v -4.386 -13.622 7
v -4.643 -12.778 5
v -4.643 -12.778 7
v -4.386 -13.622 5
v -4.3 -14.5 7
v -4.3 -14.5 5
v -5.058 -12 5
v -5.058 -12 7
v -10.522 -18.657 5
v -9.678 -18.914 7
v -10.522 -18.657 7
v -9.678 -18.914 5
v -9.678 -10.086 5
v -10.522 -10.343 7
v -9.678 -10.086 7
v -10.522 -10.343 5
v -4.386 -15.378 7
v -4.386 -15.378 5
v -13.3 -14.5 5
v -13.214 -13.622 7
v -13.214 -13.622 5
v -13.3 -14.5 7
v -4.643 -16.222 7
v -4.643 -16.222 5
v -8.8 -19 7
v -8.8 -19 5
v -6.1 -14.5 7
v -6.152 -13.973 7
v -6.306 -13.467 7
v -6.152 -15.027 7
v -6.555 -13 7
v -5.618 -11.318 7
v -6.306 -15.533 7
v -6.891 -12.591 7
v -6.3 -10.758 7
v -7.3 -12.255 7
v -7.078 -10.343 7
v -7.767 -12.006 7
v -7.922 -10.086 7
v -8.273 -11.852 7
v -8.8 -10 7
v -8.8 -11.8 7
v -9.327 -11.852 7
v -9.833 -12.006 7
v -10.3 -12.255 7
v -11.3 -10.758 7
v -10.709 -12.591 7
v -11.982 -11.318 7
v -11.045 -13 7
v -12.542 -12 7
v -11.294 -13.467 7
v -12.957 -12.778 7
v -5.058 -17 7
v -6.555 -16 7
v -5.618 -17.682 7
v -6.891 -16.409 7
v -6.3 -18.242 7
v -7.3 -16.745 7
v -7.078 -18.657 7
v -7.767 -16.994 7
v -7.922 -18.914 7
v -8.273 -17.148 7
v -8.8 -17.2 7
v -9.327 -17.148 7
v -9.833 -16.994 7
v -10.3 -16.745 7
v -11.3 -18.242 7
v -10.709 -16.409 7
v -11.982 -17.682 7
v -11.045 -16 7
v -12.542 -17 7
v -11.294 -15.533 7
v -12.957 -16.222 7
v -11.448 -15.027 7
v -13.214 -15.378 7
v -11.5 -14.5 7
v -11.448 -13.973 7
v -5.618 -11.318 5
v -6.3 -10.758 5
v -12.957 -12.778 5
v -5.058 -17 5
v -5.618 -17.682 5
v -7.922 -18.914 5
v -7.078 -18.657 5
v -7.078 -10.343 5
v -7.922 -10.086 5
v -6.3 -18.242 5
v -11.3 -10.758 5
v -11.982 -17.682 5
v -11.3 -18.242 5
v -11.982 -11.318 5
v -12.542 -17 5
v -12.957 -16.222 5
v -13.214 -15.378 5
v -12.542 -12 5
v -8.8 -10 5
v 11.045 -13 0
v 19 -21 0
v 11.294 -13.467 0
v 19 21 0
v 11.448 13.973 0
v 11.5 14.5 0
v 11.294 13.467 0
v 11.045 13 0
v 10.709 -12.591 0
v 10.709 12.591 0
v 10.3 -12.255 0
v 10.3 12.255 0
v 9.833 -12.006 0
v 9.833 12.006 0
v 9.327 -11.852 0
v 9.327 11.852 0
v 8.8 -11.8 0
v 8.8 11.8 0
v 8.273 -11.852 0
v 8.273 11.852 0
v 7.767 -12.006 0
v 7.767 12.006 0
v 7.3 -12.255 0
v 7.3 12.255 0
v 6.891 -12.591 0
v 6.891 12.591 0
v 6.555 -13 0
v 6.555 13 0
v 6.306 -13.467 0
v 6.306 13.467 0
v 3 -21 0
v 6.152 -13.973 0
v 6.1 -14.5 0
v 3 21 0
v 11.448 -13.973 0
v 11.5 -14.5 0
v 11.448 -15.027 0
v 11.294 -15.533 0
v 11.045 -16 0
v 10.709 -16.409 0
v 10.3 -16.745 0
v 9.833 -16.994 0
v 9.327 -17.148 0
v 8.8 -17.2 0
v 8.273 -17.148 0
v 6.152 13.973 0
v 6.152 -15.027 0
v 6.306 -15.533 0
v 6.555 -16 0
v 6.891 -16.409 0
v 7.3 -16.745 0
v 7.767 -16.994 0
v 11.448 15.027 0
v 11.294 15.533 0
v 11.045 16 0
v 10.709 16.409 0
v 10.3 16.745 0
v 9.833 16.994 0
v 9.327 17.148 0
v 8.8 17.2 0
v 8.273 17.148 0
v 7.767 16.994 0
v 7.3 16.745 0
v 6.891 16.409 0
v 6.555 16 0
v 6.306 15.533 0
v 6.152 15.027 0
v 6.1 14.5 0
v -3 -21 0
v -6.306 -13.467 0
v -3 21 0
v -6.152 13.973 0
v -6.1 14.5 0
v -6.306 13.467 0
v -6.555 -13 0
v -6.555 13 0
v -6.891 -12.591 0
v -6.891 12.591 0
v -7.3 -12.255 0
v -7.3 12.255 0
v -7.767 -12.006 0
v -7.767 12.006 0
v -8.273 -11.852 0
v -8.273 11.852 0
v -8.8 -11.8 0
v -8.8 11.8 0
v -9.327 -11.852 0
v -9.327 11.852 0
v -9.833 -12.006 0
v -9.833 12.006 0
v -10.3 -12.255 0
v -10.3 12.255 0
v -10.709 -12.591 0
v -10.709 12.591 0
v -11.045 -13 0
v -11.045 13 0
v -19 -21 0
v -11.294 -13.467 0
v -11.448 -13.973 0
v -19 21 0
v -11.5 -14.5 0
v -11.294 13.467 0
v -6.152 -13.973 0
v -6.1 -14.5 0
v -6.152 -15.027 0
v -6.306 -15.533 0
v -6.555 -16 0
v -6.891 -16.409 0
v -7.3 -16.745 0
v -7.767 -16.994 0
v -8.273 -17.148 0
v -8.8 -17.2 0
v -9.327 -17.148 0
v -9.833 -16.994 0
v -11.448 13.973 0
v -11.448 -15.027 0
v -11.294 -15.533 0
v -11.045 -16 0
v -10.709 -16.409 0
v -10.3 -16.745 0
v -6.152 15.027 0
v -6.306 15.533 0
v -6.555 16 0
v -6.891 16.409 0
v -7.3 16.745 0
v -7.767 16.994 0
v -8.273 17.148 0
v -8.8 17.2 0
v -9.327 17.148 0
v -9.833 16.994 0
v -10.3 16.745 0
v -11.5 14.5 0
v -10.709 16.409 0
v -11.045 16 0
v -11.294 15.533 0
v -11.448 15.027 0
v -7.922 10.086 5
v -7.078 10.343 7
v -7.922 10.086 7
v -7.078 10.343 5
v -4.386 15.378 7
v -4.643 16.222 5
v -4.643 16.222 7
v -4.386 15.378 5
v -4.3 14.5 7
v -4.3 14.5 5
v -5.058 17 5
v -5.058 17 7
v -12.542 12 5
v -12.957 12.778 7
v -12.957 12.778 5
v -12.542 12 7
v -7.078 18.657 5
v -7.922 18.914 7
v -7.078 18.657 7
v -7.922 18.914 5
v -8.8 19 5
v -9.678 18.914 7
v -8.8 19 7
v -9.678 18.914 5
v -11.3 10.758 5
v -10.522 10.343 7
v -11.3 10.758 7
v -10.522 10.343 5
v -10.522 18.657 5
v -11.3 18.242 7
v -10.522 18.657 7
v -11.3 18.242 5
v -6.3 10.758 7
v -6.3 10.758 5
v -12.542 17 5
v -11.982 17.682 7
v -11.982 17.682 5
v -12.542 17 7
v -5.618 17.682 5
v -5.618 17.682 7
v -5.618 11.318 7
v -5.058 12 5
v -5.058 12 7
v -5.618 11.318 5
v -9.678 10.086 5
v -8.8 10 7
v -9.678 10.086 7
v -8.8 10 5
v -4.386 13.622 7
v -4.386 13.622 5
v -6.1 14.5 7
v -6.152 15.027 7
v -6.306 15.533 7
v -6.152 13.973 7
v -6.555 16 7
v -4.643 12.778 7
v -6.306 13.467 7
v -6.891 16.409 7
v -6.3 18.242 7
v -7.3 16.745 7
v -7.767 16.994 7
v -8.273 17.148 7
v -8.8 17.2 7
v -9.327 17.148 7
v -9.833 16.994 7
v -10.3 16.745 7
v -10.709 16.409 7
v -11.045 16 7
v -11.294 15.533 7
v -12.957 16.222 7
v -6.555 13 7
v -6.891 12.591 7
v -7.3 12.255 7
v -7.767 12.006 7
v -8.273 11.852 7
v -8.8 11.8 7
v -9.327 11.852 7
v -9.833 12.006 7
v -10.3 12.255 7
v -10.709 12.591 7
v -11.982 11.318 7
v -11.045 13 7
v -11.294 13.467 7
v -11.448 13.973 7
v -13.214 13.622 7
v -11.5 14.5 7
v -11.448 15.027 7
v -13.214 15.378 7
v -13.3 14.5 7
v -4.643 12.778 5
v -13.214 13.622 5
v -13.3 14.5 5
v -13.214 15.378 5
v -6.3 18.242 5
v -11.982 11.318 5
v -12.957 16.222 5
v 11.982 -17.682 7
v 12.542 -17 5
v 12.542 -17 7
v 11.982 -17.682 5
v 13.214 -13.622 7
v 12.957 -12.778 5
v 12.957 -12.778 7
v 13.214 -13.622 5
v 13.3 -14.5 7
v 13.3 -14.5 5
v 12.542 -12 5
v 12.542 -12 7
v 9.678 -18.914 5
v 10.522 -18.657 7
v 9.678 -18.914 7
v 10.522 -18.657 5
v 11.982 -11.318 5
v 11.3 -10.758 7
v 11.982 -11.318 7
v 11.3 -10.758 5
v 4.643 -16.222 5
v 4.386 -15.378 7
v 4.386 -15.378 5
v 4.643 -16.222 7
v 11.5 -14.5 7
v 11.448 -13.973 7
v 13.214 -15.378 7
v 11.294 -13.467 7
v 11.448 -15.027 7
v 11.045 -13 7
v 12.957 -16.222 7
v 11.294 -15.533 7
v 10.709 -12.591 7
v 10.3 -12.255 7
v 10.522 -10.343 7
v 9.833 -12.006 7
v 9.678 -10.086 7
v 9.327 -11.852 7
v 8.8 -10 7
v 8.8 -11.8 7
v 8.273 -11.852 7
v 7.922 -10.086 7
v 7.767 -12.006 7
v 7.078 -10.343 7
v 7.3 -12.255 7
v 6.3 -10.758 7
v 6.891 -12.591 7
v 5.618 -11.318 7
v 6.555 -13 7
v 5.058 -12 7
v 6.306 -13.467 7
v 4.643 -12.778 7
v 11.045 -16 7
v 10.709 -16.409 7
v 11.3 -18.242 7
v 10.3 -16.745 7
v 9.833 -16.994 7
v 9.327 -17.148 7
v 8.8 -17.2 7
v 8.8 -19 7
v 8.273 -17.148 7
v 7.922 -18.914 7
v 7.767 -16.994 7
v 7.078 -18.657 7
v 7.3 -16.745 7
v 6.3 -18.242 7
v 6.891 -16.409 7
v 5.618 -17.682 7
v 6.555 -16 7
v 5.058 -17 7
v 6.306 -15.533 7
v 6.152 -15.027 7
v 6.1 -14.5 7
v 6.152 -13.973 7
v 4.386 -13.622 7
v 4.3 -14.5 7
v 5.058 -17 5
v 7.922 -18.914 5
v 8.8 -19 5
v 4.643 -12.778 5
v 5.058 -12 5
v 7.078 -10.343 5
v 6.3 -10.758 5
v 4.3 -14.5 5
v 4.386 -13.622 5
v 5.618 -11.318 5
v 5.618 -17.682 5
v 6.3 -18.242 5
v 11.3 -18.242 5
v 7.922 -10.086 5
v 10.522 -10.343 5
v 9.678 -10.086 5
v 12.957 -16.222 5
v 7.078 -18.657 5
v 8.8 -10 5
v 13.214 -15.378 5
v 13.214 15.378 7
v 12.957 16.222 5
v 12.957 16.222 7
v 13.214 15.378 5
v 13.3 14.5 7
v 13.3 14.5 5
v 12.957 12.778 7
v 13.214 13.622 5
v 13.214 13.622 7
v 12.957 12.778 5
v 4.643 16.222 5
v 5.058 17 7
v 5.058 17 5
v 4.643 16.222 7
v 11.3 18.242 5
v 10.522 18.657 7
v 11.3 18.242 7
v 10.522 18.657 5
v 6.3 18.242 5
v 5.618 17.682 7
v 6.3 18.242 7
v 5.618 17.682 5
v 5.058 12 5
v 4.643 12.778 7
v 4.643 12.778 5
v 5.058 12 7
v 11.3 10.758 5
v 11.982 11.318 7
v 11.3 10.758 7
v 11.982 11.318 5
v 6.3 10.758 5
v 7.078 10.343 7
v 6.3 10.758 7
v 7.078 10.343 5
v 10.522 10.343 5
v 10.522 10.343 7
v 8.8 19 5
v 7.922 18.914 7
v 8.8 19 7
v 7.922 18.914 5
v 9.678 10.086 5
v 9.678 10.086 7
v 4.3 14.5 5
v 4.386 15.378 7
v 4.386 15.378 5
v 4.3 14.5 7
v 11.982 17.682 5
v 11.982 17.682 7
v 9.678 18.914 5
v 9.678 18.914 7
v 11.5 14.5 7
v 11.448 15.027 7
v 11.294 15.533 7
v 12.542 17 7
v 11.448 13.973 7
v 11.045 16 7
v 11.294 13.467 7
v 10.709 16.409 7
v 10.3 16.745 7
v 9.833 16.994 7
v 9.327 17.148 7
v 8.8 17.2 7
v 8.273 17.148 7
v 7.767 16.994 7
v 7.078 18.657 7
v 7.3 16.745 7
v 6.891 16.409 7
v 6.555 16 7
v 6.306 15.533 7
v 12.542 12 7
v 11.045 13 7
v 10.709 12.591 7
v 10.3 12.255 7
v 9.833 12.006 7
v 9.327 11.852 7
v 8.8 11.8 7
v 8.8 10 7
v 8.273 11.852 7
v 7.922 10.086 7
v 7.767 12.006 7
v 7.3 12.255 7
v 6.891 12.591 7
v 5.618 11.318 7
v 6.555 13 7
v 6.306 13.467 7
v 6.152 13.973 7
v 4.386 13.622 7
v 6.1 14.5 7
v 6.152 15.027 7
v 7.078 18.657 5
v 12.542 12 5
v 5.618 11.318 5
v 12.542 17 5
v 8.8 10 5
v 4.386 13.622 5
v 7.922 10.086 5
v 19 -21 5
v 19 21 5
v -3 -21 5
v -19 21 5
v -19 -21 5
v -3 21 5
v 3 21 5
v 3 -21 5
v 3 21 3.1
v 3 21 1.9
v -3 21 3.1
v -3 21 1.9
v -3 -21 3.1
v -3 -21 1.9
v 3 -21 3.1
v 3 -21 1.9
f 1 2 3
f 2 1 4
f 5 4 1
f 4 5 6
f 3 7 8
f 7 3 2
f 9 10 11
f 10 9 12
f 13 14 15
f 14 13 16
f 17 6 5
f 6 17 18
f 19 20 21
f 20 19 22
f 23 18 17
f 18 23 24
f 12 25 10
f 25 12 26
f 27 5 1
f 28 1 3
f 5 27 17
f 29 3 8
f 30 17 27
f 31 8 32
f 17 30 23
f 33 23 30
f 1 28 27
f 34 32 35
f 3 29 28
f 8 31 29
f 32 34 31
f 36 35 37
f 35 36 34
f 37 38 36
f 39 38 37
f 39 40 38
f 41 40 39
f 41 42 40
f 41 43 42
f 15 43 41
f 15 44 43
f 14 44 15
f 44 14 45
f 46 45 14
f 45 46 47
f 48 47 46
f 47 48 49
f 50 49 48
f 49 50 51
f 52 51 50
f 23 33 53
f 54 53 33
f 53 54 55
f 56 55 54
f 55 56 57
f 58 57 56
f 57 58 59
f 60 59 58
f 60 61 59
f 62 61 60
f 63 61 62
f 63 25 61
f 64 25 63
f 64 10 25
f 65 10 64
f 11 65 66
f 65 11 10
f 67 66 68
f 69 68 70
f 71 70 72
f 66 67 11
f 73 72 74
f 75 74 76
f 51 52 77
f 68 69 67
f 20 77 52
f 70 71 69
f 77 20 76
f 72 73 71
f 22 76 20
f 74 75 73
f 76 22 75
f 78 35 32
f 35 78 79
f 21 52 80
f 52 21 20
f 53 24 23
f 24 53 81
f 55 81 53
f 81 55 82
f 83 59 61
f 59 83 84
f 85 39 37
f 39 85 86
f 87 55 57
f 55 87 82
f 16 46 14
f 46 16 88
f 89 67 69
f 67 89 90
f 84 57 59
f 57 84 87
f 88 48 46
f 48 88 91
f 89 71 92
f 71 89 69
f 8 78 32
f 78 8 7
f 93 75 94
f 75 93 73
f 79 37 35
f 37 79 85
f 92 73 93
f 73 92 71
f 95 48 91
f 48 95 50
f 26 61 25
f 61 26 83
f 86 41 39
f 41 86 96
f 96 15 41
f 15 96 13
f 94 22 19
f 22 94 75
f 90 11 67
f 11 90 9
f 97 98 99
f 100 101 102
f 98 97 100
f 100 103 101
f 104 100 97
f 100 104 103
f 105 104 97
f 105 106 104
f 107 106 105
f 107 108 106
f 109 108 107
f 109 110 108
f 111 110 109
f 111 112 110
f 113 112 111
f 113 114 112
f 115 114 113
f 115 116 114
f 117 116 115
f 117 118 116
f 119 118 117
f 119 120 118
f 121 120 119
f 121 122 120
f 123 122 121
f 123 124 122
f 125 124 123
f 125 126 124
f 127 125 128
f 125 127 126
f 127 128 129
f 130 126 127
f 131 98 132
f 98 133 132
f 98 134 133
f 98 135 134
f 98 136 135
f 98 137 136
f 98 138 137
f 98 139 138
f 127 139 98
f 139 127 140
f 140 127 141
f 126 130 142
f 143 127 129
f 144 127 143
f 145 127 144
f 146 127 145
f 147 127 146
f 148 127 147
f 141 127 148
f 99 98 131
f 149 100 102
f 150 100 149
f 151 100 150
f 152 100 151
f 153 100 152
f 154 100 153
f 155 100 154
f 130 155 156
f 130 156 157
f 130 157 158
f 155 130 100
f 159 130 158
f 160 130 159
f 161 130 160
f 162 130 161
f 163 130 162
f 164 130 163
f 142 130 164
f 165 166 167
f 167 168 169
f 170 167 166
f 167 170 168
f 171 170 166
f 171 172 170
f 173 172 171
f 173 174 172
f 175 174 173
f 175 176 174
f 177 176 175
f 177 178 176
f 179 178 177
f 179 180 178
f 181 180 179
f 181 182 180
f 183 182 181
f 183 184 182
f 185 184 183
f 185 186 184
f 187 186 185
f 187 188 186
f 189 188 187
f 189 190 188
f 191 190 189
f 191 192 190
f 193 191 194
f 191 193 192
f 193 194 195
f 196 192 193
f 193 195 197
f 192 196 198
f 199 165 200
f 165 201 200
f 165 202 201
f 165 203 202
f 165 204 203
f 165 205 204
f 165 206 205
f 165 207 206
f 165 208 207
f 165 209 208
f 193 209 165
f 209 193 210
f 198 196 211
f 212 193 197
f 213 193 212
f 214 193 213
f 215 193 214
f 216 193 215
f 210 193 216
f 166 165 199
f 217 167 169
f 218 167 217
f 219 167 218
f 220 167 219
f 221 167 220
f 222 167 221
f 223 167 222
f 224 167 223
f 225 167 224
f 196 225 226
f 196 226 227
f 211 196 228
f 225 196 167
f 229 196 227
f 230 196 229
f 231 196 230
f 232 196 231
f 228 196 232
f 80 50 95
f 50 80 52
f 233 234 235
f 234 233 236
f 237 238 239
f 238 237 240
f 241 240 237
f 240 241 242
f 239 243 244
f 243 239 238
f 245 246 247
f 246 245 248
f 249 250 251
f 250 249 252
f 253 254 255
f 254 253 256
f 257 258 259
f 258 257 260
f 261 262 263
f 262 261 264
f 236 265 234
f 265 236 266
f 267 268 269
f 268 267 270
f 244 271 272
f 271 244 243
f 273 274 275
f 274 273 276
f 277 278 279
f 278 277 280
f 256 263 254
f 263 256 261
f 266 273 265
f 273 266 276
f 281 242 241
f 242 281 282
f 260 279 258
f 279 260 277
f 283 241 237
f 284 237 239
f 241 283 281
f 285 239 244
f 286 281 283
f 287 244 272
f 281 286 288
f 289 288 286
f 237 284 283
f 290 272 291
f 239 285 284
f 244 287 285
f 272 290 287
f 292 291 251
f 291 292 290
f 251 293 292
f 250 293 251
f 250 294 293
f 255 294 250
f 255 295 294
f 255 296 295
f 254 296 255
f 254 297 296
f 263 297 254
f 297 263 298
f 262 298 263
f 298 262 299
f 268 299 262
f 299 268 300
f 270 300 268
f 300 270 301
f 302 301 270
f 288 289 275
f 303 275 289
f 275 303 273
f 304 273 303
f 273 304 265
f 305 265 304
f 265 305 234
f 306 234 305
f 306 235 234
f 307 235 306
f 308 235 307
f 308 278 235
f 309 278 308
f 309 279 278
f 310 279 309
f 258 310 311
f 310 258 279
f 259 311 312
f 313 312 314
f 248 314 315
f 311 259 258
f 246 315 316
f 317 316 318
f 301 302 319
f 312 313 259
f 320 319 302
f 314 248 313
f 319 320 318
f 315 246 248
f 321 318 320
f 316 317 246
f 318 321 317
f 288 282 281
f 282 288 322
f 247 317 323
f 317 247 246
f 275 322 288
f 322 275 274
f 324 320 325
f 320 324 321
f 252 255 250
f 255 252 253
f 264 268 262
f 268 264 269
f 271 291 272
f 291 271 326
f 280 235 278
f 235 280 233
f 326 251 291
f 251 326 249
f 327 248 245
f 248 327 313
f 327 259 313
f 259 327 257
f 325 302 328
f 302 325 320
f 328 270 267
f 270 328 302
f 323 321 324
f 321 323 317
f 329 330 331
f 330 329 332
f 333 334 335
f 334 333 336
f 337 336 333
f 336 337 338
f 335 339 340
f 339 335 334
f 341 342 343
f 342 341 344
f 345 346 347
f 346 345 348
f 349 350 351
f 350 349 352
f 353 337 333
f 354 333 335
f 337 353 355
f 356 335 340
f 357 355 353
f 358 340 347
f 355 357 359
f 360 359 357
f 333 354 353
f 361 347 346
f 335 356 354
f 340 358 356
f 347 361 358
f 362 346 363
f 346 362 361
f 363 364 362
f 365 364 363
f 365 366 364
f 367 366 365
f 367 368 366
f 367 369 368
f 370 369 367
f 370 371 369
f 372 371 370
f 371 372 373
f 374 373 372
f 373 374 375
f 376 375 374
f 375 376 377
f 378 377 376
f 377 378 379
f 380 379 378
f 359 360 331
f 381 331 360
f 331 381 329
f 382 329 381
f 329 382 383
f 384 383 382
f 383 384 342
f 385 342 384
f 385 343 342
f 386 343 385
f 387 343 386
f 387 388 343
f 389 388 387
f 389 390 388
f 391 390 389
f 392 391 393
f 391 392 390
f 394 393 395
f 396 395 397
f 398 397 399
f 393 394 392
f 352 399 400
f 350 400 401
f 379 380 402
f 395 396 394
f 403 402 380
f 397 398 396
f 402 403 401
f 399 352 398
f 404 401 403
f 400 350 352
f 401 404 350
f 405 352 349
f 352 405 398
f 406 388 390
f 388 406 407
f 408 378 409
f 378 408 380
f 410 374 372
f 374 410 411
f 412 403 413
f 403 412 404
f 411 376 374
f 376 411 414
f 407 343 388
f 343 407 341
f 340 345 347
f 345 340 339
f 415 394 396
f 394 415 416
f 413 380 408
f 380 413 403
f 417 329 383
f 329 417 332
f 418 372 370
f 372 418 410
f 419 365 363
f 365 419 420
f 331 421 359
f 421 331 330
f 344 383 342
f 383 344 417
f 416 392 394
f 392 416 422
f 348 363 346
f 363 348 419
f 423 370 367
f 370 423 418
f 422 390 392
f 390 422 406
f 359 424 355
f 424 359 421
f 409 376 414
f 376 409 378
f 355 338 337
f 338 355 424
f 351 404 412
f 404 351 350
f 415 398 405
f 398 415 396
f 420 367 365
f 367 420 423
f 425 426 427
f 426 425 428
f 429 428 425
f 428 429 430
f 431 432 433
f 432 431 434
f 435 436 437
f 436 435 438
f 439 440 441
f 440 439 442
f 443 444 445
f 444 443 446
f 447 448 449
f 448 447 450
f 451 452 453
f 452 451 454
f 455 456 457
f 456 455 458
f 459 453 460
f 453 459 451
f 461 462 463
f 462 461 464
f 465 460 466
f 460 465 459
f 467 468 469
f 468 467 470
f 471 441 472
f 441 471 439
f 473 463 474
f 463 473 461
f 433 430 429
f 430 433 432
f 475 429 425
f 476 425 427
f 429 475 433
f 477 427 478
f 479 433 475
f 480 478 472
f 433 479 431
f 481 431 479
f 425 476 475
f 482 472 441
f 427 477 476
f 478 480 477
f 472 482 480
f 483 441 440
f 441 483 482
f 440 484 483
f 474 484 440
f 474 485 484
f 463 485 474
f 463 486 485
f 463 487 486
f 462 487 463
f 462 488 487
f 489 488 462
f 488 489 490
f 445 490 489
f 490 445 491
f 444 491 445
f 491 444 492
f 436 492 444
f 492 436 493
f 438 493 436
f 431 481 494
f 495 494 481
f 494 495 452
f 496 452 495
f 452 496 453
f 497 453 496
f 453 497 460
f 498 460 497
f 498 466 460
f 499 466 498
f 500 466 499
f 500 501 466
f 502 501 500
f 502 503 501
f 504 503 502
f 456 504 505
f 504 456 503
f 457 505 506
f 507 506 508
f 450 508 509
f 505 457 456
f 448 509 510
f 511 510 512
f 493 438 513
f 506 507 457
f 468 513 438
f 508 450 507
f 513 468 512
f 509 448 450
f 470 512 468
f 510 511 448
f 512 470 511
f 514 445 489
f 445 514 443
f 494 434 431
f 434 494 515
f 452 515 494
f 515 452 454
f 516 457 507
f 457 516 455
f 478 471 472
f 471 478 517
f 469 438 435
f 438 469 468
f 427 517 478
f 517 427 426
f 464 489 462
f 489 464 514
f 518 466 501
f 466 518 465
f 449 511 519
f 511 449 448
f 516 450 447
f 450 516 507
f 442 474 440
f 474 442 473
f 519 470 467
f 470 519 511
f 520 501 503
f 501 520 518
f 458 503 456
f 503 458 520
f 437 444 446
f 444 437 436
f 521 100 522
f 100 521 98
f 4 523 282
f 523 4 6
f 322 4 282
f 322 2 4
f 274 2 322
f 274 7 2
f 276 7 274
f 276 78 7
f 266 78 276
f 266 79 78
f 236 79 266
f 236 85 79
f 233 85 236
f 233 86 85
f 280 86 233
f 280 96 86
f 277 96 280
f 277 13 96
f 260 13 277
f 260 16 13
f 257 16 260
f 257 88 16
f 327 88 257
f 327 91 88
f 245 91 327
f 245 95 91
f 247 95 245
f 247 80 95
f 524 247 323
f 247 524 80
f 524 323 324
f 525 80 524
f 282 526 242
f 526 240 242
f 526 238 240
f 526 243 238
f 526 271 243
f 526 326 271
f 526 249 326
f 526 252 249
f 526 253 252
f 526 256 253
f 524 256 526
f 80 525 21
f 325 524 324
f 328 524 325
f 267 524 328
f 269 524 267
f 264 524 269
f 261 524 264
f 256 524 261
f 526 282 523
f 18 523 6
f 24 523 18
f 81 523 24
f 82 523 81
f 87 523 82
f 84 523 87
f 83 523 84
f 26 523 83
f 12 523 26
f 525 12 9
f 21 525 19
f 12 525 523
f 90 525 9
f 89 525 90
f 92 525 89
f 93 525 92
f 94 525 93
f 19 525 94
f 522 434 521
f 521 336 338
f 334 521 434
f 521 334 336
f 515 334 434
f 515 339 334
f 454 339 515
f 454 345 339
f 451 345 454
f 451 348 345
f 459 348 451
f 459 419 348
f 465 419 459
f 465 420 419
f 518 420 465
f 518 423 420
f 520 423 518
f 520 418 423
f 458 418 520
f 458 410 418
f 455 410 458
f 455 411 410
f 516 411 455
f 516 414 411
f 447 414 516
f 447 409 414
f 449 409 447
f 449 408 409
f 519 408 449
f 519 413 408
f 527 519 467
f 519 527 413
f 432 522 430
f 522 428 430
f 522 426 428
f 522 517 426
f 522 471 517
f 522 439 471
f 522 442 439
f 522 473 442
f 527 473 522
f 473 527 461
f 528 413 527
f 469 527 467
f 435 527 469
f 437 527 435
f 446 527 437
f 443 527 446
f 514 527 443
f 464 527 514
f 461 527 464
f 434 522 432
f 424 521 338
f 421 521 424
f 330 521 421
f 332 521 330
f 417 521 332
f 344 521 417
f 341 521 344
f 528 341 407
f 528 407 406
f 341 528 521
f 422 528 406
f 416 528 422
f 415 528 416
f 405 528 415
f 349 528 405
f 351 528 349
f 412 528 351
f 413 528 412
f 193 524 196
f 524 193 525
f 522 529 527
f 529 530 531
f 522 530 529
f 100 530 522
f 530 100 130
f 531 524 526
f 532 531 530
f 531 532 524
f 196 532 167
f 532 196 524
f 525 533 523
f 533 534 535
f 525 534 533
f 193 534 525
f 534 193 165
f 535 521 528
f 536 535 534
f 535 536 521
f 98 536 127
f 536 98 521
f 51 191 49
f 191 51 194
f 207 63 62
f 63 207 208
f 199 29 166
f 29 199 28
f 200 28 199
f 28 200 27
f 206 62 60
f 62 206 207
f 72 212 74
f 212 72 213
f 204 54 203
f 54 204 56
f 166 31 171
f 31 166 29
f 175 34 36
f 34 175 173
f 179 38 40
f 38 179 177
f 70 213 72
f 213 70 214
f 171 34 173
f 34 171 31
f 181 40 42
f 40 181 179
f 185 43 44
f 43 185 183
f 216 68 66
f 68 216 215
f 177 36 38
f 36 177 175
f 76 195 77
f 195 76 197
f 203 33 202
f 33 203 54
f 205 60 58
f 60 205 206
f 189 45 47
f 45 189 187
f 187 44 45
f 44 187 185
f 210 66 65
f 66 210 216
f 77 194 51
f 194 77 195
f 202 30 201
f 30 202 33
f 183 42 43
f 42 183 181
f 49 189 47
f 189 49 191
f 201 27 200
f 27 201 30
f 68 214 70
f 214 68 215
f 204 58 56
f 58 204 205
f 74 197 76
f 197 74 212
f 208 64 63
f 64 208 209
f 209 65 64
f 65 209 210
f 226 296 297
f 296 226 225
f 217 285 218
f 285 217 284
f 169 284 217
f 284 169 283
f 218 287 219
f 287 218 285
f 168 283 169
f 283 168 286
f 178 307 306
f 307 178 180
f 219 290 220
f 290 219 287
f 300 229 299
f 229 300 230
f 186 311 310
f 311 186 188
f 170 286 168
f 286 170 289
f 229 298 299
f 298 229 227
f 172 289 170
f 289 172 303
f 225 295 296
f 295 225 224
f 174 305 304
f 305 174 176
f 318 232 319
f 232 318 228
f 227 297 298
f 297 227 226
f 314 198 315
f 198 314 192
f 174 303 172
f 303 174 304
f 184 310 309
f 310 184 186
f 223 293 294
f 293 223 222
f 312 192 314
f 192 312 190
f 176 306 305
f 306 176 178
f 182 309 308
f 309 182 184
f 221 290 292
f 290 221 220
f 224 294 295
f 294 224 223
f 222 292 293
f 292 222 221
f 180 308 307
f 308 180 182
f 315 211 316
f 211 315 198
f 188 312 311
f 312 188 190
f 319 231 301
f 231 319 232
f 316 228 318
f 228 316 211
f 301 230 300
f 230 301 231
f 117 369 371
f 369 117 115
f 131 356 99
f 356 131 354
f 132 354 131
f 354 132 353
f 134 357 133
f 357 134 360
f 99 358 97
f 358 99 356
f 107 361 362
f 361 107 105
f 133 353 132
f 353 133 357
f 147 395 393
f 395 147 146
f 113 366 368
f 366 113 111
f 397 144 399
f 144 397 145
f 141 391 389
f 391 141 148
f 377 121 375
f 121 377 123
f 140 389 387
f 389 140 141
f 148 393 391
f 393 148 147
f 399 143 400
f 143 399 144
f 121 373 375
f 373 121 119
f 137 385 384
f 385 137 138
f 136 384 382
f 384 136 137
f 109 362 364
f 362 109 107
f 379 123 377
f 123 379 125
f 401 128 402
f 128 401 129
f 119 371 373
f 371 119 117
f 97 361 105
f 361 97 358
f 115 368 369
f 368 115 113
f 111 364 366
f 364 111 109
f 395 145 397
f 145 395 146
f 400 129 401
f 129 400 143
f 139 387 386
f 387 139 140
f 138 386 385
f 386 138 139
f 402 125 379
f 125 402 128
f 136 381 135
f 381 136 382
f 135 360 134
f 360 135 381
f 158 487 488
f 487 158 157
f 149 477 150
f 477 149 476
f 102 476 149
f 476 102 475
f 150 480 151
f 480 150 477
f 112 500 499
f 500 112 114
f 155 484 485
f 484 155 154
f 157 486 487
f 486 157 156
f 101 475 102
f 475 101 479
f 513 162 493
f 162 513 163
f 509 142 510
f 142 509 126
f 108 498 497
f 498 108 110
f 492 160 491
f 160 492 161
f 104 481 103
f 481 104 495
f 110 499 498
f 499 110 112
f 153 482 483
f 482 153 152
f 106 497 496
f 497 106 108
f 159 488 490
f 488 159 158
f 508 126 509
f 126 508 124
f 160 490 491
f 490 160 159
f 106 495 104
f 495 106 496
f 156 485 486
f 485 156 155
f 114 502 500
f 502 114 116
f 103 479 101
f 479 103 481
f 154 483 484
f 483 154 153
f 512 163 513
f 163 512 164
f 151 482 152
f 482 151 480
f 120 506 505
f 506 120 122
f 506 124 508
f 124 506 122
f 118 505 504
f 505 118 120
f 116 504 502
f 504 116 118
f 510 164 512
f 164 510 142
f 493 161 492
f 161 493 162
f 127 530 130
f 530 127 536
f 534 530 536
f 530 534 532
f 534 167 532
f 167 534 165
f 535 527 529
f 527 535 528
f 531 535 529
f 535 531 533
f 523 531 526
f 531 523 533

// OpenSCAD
$fn = 32;

// ----------------------------------------------------------------------
// Living hinge: 38 x 42 mm plates, 1.2 mm flexible web
// ----------------------------------------------------------------------

// --- parameters (mm) ---
plate_len = 16;           // plate length outside the web
plate_w = 42;             // plate width
thick = 5;                // plate thickness
web_half = 3;             // half width of the flex band
web_t = 1.2;              // flexible web thickness
web_z = 1.9;              // web position inside the thickness
boss_d = 9;               // screw boss diameter
boss_h = 7;               // screw boss height
boss_x = 8.8;             // screw boss distance from the web
screw_d = 5.4;            // screw hole

difference() {
  union() {
    /* one flat strip, later thinned at the middle */
    translate([-19, -21, 0]) cube([38, 42, 5]);
    /* screw bosses, sunk 0.5 mm into the plates */
    for (sx = [-8.8, 8.8]) {
      for (sy = [-14.5, 14.5]) {
        translate([sx, sy, 0]) cylinder(h = boss_h, d = boss_d);
      }
    }
  }
  /* channel from below: leaves the web on top of it */
  translate([-3, -23.5, -2.5]) cube([6, 47, 4.4]);
  /* channel from above: thins the web down to web_t */
  translate([-3, -23.5, 3.1]) cube([6, 47, 4.4]);
  /* screw holes through the bosses */
  for (sx = [-8.8, 8.8]) {
    for (sy = [-14.5, 14.5]) {
      translate([sx, sy, -2.5]) cylinder(h = boss_h + 5, d = screw_d);
    }
  }
}
